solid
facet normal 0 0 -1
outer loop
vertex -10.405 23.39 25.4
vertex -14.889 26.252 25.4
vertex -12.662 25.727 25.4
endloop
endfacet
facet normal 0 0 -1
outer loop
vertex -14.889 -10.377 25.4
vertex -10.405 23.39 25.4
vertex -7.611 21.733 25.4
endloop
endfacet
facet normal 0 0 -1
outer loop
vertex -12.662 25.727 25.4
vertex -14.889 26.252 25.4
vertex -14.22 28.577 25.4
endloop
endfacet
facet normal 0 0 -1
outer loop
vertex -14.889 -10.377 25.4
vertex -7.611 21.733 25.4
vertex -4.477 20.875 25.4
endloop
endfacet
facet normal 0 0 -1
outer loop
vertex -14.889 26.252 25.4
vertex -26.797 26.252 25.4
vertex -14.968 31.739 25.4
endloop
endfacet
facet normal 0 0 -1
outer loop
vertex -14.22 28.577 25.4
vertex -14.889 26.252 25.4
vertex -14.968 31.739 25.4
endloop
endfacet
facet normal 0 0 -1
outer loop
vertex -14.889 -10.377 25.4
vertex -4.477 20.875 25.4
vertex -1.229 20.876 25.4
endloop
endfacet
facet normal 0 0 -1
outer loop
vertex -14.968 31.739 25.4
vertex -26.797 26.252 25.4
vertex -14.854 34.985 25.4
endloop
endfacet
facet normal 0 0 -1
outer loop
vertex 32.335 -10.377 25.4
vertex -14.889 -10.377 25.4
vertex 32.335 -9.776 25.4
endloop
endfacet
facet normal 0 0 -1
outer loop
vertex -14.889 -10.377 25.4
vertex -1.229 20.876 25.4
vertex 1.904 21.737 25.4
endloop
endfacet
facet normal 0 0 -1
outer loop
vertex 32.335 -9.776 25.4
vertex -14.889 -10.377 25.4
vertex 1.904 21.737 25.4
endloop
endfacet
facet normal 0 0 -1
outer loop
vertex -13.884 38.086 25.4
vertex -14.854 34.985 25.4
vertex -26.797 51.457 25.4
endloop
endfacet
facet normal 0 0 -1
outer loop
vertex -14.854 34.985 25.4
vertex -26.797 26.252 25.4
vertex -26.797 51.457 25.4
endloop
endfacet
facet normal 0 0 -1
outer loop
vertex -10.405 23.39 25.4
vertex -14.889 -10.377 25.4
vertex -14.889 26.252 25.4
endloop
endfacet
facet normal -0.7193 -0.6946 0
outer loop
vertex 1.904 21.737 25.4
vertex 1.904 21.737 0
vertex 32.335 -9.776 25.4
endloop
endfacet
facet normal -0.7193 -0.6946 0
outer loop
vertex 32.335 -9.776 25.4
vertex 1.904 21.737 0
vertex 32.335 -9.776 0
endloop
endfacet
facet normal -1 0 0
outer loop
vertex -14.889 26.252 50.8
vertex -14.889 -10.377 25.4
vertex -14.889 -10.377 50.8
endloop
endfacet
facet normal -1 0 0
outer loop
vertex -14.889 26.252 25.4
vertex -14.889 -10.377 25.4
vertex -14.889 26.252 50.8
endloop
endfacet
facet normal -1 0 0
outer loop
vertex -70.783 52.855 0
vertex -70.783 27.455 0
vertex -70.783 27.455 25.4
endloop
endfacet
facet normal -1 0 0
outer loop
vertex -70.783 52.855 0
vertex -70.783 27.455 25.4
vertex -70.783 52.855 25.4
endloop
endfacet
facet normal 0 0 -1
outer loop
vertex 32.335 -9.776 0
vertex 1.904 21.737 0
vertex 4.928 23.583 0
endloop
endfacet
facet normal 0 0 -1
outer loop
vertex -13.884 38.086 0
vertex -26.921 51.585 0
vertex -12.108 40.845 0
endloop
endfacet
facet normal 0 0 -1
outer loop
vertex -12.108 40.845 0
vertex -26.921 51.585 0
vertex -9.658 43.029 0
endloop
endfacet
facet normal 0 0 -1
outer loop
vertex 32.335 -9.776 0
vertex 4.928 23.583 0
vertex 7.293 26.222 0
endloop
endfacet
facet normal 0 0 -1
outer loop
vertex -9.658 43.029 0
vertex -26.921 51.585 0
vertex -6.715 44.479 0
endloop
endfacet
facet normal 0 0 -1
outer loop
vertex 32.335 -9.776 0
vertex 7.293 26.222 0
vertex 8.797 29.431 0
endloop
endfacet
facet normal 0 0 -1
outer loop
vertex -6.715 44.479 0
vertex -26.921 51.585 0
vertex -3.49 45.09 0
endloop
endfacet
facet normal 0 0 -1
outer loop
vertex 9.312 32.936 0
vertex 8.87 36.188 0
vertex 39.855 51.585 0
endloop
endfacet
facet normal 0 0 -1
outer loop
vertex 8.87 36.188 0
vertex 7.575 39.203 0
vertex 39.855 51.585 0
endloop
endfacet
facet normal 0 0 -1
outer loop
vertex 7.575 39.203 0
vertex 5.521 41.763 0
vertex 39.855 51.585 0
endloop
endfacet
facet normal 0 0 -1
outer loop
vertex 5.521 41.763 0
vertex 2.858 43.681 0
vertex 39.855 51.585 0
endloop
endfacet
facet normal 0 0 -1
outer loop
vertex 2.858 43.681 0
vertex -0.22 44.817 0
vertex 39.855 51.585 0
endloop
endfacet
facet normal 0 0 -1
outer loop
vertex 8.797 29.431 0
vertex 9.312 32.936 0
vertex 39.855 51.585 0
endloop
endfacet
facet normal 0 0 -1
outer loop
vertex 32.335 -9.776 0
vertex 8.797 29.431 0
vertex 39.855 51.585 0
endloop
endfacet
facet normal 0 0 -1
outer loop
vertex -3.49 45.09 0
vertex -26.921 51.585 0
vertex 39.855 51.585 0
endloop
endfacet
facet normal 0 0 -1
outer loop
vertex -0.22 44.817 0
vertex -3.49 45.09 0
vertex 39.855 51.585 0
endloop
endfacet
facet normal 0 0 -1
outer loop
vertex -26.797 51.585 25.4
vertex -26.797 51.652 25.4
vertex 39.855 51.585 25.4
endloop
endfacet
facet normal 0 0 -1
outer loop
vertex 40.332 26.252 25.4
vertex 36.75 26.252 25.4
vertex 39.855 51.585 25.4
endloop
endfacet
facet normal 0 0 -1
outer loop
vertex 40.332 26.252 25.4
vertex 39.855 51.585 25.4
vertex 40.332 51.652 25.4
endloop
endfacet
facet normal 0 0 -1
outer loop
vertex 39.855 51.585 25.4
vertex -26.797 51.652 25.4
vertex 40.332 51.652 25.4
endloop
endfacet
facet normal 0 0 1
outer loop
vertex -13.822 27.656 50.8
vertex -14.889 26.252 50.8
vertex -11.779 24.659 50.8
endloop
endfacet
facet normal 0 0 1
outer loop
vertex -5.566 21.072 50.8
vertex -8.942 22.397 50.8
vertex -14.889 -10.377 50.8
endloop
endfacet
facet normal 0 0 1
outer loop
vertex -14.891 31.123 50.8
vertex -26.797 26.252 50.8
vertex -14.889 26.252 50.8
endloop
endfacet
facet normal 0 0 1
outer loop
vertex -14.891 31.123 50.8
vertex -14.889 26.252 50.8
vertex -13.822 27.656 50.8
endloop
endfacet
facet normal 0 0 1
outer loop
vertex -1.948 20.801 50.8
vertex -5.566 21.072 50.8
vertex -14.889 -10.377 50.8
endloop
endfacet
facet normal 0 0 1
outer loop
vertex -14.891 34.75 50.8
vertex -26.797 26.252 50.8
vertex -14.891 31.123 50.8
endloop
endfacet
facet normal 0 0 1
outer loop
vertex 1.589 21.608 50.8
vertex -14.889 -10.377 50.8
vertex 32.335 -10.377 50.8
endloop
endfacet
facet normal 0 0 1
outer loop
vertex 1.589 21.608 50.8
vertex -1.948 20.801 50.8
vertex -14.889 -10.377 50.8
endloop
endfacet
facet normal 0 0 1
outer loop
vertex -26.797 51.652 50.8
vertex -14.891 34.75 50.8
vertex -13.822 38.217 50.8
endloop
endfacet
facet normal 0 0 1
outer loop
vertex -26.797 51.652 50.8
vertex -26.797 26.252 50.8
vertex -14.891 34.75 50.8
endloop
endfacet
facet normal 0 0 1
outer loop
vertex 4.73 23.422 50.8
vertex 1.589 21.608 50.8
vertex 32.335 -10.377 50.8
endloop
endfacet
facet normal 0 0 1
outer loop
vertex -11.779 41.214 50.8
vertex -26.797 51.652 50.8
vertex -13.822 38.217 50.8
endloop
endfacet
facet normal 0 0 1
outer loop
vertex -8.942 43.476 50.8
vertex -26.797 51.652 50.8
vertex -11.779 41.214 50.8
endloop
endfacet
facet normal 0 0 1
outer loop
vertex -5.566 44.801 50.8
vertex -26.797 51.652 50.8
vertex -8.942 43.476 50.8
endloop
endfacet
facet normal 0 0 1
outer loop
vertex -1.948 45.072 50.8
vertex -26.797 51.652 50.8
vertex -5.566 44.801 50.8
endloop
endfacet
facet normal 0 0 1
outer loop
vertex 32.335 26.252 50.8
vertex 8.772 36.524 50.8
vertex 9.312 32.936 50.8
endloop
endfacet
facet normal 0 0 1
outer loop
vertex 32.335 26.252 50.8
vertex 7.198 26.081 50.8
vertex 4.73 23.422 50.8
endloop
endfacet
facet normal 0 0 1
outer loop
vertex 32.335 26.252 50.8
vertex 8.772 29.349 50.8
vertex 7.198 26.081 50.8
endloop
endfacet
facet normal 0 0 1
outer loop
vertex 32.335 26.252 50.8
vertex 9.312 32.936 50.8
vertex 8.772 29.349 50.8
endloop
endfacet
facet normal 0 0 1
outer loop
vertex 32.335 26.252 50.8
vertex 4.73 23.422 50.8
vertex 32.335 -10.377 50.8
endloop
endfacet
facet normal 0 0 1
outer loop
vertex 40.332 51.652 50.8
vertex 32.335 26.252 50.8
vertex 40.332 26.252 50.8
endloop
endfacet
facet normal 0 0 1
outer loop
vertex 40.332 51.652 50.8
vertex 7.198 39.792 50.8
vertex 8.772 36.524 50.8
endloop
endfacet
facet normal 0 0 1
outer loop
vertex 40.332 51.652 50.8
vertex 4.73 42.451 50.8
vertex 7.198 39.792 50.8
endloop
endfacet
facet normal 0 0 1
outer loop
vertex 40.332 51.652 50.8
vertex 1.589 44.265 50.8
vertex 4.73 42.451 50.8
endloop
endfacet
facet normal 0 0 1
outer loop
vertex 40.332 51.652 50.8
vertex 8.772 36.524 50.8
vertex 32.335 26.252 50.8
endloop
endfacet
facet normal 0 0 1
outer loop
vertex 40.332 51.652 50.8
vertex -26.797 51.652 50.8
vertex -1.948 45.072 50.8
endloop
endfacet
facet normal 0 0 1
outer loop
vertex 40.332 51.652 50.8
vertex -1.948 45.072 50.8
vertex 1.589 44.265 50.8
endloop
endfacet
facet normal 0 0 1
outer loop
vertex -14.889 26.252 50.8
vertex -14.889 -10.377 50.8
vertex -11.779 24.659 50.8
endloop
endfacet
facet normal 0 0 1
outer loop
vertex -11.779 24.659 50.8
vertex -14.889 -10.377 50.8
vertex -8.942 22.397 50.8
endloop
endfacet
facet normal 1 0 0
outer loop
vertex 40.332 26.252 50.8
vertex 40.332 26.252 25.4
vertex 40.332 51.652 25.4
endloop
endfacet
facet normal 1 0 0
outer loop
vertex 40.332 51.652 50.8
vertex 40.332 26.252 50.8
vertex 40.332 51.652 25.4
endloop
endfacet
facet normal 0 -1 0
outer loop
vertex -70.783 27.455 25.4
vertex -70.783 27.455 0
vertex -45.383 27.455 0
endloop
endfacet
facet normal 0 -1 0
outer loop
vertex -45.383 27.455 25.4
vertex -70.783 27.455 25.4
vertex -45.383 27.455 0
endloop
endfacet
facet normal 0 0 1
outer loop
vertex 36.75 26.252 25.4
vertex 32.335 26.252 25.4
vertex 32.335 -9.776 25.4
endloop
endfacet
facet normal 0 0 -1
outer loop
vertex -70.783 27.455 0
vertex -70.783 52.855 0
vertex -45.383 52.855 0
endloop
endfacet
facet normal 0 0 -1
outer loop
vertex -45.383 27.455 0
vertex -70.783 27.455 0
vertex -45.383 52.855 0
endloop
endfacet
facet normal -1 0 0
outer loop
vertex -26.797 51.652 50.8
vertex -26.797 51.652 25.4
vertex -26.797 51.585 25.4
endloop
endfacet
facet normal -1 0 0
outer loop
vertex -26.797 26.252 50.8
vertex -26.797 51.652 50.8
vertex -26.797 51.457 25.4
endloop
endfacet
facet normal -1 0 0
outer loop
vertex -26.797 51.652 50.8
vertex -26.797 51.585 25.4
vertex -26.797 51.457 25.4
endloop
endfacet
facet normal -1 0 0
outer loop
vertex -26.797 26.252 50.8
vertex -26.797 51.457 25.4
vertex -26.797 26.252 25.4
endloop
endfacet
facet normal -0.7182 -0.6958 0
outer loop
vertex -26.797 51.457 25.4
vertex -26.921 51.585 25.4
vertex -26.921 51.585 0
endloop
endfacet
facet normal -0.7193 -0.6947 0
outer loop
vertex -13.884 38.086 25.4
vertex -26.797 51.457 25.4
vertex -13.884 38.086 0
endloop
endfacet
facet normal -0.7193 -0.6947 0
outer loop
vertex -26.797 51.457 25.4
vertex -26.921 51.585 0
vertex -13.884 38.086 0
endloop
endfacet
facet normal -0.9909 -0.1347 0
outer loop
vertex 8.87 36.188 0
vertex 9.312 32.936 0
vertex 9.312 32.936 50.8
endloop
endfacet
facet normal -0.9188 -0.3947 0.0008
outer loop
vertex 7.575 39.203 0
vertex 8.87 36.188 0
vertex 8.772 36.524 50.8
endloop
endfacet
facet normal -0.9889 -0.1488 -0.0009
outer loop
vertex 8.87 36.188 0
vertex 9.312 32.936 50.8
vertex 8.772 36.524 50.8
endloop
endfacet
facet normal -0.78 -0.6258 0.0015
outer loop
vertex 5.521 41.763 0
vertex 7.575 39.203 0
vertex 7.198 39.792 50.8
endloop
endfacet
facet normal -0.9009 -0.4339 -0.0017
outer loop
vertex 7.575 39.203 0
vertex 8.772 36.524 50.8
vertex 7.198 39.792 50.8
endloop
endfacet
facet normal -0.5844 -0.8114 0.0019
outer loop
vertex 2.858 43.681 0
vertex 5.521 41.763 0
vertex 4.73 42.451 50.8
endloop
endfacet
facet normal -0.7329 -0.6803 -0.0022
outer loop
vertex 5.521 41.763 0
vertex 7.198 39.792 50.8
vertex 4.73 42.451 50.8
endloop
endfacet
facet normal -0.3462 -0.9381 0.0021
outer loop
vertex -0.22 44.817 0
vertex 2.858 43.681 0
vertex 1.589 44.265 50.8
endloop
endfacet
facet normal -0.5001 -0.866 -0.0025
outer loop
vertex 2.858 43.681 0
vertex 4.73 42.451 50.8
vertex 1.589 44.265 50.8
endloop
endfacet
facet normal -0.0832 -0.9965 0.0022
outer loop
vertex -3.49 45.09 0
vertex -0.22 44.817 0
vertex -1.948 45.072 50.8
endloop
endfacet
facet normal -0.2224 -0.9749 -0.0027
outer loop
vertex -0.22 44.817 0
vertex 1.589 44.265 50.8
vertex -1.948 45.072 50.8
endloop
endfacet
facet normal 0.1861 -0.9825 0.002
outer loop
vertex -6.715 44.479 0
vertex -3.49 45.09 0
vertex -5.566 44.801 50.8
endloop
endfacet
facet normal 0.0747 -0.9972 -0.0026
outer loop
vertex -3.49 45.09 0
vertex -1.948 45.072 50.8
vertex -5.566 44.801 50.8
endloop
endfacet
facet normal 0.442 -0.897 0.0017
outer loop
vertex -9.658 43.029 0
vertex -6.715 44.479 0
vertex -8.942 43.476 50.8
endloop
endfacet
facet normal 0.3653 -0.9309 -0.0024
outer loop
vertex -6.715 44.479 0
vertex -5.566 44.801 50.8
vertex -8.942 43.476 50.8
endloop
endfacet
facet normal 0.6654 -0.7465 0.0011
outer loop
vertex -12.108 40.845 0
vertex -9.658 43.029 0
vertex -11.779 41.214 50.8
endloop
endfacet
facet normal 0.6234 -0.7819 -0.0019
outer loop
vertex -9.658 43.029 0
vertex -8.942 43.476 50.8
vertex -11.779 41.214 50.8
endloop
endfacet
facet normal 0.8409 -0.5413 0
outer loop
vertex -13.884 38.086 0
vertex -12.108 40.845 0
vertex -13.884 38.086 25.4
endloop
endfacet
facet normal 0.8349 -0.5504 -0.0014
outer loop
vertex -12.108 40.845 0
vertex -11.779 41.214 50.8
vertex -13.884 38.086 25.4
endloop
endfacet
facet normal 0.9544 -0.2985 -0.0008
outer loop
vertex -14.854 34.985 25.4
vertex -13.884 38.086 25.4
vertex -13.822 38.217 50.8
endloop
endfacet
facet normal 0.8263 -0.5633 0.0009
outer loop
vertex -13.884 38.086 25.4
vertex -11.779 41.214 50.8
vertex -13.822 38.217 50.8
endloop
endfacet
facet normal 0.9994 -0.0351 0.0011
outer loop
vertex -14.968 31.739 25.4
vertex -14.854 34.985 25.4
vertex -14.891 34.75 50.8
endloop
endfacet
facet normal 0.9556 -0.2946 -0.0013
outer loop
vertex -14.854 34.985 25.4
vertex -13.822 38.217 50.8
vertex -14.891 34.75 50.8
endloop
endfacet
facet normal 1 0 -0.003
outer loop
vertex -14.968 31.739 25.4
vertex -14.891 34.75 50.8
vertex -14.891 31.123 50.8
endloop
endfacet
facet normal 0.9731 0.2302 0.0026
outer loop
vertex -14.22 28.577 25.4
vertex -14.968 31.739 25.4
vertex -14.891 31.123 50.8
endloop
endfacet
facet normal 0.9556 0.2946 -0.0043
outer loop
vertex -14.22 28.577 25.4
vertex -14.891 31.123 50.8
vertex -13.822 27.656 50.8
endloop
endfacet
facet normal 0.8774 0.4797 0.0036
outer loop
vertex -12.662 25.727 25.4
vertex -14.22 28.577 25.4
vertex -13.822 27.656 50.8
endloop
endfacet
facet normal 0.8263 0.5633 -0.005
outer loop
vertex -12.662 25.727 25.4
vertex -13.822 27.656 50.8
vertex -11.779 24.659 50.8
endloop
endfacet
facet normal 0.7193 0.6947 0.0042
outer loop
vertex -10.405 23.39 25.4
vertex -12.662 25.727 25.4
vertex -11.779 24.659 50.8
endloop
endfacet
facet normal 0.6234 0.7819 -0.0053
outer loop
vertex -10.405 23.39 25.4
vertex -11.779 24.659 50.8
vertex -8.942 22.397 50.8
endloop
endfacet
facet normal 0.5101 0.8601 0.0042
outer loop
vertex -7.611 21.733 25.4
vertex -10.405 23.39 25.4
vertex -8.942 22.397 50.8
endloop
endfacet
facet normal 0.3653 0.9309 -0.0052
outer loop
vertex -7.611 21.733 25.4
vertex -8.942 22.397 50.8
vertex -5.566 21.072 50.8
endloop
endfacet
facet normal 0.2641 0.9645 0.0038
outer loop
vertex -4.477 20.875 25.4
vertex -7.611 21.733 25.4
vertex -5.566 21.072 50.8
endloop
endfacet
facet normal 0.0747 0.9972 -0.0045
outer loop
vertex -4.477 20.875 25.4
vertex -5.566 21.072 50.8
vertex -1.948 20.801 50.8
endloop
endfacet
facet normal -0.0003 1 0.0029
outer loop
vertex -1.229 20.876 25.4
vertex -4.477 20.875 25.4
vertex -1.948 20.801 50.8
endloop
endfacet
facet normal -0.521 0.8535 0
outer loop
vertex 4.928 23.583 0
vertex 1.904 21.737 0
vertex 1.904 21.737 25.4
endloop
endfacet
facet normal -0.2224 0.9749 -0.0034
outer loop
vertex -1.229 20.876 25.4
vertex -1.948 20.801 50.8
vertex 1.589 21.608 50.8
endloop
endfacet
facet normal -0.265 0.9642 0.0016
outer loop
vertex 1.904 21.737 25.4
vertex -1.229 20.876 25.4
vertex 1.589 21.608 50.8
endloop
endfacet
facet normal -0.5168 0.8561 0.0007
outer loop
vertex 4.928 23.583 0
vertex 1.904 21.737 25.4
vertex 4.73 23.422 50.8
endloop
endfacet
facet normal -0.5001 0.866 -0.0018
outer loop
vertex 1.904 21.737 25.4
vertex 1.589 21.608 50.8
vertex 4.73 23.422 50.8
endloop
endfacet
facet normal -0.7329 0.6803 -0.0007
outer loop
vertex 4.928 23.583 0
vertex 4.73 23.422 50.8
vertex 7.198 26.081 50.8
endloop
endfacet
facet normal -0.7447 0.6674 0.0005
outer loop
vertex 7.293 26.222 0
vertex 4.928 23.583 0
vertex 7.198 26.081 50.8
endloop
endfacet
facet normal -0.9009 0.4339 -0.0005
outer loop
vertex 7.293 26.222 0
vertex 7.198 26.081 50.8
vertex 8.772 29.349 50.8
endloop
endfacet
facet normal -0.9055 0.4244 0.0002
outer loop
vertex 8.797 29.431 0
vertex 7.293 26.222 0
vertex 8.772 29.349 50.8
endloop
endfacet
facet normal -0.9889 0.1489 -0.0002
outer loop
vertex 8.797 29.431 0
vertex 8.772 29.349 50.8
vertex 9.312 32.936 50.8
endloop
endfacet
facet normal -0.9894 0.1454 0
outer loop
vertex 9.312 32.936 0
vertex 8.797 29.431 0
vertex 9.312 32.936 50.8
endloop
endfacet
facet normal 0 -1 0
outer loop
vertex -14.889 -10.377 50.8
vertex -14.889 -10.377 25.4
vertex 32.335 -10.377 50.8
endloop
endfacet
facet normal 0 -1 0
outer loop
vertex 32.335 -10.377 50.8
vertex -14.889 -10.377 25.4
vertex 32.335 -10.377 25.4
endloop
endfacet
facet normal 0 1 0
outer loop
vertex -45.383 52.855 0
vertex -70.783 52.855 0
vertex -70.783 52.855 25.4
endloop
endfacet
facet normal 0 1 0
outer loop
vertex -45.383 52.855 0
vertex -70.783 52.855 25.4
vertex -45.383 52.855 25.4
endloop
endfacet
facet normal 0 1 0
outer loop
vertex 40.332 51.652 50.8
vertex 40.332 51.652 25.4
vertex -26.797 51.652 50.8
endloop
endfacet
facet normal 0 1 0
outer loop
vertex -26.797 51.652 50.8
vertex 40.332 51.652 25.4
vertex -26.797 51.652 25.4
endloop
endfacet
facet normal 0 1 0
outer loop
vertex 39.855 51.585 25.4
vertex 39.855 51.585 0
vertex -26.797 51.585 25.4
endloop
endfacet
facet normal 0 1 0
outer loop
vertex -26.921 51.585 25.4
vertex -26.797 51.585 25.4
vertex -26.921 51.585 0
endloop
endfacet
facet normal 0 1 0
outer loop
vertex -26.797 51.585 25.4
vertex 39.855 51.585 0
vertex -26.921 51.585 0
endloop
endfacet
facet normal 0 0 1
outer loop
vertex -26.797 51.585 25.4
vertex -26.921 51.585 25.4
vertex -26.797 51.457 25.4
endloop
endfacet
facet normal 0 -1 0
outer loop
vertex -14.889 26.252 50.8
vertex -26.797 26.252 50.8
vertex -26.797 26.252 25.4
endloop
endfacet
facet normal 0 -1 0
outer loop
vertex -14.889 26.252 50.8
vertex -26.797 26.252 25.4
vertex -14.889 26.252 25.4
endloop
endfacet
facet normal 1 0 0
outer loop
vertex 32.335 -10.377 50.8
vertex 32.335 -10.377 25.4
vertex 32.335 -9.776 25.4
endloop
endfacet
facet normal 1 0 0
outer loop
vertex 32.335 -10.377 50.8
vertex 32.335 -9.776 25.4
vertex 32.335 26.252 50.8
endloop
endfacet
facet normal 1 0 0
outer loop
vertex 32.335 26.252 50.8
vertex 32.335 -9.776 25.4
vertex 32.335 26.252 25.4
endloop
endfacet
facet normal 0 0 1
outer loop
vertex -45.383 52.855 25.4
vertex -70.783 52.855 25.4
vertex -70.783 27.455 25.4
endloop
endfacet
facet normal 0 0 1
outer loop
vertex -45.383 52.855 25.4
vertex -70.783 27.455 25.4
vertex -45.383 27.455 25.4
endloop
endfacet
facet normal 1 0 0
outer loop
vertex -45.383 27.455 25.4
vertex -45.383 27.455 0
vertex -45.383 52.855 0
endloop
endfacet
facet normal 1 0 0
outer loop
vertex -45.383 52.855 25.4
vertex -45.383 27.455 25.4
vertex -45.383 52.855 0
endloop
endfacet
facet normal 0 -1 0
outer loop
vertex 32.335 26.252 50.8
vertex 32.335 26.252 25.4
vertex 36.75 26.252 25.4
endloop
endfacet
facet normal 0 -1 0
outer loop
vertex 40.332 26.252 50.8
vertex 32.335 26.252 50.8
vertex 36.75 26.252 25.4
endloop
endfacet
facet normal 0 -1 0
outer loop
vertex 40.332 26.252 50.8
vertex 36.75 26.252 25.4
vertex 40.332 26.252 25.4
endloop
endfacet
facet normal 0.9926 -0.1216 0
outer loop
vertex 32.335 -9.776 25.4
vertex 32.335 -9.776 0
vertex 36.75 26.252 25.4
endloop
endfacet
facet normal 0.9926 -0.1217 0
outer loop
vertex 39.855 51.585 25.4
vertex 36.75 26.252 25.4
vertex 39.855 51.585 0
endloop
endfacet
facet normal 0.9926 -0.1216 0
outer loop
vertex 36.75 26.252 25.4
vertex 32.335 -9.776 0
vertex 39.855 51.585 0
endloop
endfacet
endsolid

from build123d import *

# Parameters (mm, degrees)
F0_W     = 25.4
F0_H     = 25.4
F1_DEPTH = 25.4
F2_W     = 47.2239479423
F2_H     = 36.629473637
F3_DEPTH = 25.4
F5_DEPTH = 25.4
F6_R     = 12.1699018859
F7_DEPTH = 152.4


# Not quite as in the source:
# - a feature names something its author has since deleted; it is built from what else it names


with BuildPart() as f1:
    # F0 (on Top) → F1 (new body)
    with BuildSketch(Plane.XY):
        with Locations((-58.0832177849, 40.1553949341)):
            Rectangle(F0_W, F0_H)
    extrude(amount=F1_DEPTH)


with BuildPart() as f3:
    # F2 (on face) → F3 (new body)
    with BuildSketch(Plane.XY.offset(25.4)):
        Polygon((40.3320500055, 51.6522369951), (-26.7965224931, 51.6522369951), (-26.7965224931, 26.2522369951), (-14.8890800774, 26.2522369951), (32.3348678648, 26.2522369951), (40.3320500055, 26.2522369951), align=None)
        with Locations((8.7228938937, 7.9375001766)):
            Rectangle(F2_W, F2_H)
    extrude(amount=F3_DEPTH)

    # F4 (on Top) → F5 (join)
    with BuildSketch(Plane.XY):
        Polygon((39.8546084762, 51.5853948891), (-26.9206576049, 51.5853948891), (32.3348678648, -9.7756581381), align=None)
    extrude(amount=F5_DEPTH)

    # F6 (on face) → F7 (cut)
    with BuildSketch(Plane.XY.offset(50.8)):
        with Locations((-2.8575004544, 32.936450094)):
            Circle(F6_R)
    extrude(amount=-F7_DEPTH, mode=Mode.SUBTRACT)


solid = Compound([f1.part, f3.part])
